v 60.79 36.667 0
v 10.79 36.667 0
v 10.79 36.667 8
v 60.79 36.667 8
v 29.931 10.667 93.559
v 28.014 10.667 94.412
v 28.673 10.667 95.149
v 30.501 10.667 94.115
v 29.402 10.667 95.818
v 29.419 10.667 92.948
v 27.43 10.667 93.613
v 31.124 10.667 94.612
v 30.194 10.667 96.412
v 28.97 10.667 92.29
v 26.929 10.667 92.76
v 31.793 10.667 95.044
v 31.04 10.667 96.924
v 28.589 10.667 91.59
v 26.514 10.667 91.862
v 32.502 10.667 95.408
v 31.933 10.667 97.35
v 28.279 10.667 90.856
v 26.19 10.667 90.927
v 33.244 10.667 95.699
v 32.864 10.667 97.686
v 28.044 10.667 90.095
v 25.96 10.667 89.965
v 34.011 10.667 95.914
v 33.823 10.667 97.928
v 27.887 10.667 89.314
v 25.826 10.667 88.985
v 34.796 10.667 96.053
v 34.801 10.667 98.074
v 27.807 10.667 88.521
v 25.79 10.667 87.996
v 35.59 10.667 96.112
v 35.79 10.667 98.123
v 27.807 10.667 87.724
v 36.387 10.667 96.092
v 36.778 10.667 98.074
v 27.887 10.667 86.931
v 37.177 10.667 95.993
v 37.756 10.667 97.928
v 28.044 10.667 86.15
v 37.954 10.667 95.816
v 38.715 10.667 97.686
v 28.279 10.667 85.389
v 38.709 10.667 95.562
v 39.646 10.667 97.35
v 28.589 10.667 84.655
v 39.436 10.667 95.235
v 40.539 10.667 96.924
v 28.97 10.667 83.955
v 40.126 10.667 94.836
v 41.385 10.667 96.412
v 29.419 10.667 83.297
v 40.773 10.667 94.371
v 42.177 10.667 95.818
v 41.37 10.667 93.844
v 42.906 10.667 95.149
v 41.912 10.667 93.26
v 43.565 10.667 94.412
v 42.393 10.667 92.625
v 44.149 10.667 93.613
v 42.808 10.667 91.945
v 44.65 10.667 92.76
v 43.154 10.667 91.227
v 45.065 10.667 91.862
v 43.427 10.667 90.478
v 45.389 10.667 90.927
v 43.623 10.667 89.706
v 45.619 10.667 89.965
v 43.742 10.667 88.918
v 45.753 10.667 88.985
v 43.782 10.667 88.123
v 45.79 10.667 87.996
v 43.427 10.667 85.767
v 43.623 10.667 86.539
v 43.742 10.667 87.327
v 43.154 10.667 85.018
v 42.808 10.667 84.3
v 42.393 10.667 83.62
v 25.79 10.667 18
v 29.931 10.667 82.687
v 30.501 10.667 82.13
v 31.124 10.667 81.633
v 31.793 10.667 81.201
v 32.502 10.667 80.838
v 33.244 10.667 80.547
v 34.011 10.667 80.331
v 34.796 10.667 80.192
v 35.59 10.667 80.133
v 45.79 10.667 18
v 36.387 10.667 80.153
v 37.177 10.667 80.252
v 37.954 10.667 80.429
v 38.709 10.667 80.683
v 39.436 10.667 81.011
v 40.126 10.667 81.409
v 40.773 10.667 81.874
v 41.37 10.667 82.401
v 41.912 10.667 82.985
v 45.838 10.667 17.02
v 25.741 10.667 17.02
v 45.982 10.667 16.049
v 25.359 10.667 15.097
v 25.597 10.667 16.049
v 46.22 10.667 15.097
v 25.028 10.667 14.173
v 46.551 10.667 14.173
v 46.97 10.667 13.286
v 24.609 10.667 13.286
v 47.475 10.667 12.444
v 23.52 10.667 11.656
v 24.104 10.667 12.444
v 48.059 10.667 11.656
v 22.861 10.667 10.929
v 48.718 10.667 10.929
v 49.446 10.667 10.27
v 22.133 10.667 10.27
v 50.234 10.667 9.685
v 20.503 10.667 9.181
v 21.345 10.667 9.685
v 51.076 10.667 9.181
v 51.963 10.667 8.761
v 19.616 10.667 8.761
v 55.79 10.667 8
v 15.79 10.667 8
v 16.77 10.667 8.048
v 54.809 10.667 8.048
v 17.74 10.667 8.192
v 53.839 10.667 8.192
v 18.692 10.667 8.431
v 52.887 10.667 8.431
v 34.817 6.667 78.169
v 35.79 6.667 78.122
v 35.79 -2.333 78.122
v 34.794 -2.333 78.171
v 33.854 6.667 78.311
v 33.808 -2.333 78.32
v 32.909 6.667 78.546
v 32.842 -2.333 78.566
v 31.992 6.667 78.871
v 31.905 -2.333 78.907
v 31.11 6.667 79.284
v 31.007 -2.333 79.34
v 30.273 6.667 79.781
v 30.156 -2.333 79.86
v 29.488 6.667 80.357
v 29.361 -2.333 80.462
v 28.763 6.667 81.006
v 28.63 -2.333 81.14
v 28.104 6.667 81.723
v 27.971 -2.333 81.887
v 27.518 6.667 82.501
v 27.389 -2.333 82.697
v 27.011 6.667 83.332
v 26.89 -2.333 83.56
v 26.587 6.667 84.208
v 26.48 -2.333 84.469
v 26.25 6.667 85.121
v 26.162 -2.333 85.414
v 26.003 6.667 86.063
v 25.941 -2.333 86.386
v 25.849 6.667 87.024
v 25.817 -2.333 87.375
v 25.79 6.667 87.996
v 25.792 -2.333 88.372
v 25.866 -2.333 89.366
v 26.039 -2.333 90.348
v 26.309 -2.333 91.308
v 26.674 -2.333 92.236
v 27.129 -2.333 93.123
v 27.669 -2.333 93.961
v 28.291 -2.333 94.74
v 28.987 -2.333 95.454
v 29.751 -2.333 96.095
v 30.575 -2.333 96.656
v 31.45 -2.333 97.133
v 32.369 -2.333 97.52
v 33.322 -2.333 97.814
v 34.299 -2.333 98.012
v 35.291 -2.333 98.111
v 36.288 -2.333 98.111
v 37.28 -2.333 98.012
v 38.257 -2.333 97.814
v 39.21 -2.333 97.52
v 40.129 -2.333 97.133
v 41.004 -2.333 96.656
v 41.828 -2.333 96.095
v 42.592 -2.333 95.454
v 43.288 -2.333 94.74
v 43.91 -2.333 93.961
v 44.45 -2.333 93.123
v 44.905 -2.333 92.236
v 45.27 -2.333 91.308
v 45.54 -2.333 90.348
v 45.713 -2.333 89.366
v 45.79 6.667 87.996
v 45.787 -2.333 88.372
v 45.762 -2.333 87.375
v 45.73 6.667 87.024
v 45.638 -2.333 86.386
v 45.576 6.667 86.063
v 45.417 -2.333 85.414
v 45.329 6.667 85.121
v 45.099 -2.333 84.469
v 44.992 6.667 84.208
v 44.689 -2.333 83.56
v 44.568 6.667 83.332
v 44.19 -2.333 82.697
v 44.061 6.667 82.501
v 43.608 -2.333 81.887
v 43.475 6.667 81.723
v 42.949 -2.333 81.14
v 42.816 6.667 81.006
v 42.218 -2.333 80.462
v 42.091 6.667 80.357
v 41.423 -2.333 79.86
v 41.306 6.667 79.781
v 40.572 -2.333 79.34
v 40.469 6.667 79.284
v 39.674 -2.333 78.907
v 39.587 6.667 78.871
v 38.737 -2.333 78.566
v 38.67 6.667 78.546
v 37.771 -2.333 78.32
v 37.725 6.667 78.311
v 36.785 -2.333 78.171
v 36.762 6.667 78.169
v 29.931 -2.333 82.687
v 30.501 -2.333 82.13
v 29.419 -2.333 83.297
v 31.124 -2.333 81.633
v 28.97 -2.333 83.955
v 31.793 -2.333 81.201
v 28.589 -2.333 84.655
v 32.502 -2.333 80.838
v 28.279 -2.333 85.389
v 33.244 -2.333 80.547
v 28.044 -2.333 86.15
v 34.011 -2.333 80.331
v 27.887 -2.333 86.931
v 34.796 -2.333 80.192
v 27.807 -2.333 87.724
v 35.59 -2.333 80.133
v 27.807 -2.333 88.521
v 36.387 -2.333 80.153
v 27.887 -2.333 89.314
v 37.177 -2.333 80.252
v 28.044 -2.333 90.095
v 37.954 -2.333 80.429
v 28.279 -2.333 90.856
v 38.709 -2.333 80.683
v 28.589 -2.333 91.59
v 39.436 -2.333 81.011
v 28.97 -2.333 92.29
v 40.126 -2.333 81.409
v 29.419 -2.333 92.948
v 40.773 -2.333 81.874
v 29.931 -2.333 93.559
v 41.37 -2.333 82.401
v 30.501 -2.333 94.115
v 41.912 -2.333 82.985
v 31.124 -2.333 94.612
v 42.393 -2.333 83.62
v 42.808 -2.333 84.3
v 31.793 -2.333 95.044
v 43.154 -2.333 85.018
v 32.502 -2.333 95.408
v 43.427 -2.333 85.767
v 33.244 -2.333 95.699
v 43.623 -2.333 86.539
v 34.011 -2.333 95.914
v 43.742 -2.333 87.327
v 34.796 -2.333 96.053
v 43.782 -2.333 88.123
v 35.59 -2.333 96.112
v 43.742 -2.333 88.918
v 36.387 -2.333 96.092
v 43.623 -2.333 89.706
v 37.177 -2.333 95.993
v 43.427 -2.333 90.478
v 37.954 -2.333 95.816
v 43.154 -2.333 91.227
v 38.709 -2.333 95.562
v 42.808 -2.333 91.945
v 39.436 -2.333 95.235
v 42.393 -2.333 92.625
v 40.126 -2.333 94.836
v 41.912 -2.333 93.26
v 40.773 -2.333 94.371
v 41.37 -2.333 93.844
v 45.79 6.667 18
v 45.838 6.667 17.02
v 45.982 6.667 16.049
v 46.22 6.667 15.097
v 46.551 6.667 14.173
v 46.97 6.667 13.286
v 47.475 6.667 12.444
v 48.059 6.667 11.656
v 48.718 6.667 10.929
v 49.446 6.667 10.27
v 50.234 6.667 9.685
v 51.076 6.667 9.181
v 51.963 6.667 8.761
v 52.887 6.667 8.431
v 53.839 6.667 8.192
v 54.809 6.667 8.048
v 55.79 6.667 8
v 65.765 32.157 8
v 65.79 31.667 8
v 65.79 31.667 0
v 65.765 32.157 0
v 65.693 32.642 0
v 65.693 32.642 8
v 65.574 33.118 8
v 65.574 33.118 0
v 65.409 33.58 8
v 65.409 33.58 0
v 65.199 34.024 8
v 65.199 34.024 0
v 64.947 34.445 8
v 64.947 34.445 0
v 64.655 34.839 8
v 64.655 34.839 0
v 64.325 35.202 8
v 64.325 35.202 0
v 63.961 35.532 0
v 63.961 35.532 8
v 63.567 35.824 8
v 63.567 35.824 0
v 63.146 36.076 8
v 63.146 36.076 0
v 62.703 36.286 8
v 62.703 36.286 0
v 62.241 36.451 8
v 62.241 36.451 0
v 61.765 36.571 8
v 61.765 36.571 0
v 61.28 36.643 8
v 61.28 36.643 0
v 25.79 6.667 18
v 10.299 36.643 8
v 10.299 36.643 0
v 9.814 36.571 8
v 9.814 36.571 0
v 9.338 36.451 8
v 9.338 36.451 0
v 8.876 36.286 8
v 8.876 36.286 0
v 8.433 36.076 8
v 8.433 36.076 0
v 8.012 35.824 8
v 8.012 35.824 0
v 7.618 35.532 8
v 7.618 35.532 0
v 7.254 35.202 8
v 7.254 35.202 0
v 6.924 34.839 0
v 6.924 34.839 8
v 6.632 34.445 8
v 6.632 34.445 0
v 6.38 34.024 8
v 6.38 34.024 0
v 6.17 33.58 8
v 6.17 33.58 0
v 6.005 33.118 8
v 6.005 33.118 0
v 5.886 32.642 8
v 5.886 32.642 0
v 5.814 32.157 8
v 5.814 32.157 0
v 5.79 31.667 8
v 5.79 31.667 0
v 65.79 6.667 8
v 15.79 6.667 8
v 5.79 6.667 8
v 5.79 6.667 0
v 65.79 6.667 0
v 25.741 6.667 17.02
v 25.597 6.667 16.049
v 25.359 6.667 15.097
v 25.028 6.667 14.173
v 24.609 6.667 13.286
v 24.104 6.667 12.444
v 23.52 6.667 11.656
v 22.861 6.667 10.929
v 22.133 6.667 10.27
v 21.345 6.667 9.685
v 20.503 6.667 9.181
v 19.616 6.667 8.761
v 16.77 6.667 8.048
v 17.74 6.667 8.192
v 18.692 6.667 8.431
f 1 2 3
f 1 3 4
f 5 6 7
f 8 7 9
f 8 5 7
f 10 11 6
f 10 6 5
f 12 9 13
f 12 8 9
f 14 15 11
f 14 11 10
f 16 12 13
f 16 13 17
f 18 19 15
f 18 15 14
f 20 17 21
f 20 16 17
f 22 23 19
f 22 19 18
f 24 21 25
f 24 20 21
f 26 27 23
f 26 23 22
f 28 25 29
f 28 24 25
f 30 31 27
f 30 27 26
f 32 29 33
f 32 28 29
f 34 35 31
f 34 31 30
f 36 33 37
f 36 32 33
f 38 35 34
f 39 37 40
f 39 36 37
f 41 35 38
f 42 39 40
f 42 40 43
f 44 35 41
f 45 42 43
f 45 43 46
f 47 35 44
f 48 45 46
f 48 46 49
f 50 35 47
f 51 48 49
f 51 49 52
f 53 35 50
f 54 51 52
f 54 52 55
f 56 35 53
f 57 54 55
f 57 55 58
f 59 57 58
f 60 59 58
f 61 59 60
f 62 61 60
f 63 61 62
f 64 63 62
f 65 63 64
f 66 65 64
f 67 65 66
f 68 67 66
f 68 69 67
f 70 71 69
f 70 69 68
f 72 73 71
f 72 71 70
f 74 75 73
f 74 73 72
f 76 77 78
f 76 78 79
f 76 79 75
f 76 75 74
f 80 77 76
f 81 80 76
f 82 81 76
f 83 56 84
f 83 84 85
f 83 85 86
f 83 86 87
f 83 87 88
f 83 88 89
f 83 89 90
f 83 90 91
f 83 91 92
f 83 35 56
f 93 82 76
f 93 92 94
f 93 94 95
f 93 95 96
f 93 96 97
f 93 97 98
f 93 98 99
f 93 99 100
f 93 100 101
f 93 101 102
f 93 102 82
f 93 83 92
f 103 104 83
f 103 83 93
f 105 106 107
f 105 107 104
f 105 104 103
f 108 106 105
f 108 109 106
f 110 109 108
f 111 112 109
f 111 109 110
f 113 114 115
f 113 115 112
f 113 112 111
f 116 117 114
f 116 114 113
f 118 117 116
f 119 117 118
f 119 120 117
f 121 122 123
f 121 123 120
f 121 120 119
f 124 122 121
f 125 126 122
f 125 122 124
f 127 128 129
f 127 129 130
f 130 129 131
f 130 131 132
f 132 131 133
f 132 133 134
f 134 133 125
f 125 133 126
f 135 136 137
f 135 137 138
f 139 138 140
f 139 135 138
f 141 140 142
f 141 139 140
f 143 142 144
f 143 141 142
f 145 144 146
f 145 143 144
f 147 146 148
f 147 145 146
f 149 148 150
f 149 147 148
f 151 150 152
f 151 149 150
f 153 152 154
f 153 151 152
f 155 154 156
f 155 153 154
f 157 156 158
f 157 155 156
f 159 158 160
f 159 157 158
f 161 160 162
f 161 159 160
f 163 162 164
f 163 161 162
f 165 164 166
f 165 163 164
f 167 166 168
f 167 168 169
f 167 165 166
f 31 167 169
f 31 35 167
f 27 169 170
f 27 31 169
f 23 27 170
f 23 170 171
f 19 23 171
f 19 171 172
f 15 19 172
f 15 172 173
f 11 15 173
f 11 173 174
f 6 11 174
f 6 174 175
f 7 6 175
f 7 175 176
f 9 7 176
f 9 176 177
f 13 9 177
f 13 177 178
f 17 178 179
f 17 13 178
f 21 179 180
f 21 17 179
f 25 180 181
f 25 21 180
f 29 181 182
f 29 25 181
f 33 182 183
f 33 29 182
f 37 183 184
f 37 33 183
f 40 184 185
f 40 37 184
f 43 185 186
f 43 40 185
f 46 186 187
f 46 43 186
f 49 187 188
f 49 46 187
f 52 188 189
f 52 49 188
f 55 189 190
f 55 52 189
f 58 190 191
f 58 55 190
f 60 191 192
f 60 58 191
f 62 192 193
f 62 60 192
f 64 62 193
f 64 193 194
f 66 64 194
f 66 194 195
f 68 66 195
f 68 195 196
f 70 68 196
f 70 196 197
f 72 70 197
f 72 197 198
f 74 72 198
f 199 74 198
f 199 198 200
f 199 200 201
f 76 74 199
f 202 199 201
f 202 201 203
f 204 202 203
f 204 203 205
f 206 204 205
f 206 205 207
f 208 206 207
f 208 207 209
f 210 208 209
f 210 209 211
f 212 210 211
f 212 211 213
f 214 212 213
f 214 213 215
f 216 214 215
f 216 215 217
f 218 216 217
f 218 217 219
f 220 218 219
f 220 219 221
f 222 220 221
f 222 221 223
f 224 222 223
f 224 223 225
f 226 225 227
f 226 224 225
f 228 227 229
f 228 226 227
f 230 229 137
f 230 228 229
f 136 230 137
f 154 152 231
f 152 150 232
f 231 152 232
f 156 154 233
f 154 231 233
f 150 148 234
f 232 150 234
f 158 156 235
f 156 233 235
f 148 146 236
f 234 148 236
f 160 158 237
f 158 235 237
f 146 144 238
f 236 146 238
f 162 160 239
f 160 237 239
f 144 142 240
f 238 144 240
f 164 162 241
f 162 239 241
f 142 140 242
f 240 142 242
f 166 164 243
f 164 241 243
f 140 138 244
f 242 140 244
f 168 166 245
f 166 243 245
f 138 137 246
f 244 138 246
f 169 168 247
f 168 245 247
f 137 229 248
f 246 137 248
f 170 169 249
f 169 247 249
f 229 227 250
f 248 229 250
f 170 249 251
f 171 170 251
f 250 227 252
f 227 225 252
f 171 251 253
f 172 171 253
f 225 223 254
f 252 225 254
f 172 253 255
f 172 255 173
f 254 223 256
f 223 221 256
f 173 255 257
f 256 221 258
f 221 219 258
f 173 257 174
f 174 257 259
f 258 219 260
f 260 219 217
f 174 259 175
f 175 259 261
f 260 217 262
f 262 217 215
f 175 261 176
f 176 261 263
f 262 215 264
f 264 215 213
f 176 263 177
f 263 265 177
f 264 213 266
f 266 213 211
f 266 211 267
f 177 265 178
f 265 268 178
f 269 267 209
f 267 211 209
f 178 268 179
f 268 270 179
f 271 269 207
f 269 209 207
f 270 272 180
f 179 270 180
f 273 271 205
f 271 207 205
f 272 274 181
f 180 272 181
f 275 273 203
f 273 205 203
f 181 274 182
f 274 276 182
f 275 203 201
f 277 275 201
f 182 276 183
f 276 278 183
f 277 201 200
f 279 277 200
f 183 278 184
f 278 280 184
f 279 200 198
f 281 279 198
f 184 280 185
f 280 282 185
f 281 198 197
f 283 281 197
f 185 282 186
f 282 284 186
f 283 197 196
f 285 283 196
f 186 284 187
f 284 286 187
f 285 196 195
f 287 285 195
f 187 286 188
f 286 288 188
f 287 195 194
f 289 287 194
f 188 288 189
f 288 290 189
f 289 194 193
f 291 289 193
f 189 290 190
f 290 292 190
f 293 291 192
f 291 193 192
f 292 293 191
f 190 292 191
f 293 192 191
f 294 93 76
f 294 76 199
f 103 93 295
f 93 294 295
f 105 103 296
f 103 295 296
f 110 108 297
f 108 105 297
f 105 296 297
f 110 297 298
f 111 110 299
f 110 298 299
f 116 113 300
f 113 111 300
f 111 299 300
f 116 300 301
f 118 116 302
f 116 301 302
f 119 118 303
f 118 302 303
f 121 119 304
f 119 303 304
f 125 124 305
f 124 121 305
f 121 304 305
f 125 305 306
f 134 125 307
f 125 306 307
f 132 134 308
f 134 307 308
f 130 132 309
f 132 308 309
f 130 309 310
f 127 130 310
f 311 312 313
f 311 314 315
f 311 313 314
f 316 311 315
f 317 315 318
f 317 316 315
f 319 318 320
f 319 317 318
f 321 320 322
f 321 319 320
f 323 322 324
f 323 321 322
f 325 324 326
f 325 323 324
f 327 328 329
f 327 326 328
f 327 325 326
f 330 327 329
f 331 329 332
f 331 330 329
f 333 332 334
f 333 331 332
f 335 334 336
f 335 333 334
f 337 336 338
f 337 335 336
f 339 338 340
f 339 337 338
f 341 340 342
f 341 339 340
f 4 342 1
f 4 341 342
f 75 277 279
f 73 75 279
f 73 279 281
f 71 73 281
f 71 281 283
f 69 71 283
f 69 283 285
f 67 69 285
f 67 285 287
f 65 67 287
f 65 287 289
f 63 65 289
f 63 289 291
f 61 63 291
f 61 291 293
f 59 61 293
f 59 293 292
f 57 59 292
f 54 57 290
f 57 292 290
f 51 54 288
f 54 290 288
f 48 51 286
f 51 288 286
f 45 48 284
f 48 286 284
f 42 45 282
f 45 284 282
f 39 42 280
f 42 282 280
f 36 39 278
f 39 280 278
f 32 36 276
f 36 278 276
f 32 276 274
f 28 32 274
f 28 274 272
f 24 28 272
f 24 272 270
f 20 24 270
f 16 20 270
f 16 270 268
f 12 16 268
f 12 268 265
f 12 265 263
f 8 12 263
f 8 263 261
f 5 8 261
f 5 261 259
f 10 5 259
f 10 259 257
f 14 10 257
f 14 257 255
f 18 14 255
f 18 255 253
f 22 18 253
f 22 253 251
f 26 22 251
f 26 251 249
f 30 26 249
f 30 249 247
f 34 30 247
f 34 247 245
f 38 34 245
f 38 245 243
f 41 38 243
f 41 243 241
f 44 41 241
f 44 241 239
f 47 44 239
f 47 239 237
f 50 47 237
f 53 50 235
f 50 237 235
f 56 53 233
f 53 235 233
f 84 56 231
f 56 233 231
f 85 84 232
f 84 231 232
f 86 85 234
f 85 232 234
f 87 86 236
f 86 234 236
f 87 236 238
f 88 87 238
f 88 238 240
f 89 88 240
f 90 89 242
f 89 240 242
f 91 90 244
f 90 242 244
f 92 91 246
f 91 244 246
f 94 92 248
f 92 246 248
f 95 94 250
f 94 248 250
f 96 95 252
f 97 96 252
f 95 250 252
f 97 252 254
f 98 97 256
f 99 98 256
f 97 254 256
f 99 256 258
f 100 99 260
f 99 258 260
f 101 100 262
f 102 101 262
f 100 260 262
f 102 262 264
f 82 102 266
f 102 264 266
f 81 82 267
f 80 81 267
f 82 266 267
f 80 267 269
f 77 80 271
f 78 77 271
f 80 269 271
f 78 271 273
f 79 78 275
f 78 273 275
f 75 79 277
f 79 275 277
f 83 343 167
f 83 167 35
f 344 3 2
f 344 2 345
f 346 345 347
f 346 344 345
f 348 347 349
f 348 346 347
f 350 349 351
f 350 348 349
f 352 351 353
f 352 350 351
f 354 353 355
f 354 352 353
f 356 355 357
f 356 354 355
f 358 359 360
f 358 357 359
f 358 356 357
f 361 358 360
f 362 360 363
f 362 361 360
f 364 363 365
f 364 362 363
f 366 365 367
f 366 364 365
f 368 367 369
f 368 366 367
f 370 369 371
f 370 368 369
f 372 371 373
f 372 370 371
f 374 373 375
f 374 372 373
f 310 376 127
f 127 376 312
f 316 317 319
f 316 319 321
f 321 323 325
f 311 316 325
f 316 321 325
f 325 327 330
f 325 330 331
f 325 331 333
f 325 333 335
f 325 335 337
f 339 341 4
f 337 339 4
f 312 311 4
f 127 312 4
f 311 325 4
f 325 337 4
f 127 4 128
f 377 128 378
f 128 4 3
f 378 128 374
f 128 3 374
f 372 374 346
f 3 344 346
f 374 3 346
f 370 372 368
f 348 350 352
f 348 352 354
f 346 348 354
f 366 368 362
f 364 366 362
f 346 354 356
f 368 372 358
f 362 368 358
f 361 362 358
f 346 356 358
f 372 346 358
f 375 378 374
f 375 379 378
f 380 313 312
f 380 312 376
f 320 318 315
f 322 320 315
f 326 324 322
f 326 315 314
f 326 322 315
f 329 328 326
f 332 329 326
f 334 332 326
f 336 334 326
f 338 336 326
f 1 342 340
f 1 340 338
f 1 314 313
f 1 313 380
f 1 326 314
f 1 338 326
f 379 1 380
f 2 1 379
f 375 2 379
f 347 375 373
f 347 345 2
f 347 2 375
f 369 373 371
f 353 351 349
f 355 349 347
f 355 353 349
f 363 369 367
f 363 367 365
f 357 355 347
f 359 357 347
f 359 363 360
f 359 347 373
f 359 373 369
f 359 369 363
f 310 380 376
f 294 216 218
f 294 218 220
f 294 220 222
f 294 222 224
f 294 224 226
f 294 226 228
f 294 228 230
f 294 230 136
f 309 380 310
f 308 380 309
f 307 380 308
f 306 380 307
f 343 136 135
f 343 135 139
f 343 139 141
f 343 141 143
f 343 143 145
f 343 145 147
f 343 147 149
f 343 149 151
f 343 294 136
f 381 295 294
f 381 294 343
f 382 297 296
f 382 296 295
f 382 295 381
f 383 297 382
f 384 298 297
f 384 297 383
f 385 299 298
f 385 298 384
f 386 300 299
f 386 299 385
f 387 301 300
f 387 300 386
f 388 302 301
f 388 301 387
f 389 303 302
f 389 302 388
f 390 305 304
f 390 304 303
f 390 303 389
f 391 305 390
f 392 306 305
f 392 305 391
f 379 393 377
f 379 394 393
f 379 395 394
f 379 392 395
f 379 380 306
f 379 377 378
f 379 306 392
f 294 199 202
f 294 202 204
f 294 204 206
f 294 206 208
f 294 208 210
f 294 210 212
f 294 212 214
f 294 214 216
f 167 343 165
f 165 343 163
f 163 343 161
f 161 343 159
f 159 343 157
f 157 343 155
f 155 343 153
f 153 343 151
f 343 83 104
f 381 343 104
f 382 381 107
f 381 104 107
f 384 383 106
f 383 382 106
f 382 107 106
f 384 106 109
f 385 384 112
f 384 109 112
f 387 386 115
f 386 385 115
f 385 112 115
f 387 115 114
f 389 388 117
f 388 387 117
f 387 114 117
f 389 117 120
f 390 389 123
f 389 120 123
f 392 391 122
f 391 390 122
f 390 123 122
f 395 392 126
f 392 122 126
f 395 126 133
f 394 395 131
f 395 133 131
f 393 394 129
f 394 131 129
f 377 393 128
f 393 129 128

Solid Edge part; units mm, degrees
sketch "Sketch1" plane through (0, 0, 0) normal (0, 0, 1) x (1, 0, 0)
  line L0 (5.7895, 6.6667) -> (5.7895, 36.6667)
  line L1 (5.7895, 36.6667) -> (65.7895, 36.6667)
  line L2 (65.7895, 36.6667) -> (65.7895, 6.6667)
  line L3 (65.7895, 6.6667) -> (5.7895, 6.6667)
  dimension "D1" = 60
  dimension "D2" = 30
extrude "Protrusion1" add sketch "Sketch1" along normal blind 8
fillet "Round_1" radius 5 2 edges at (65.7895, 36.6667, 4) (5.7895, 36.6667, 4)
sketch "Sketch2" plane through (35.7895, 21.6667, 8) normal (0, 0, 1) x (0, 1, 0)
  line L0 (-15, 10) -> (-11, 10)
  line L1 (-11, 10) -> (-11, -10)
  line L2 (-11, -10) -> (-15, -10)
  line L3 (-15, -10) -> (-15, 10)
  dimension "D1" = 20
  dimension "D2" = 20
extrude "ExtrudedProtrusion_3" add sketch "Sketch2" along normal blind 80
sketch "Sketch3" plane through (35.7895, 10.6667, 48) normal (0, 1, 0) x (0, 0, -1)
  circle A0 centre (-40.1226, 0) radius 10.0008
extrude "ExtrudedProtrusion_4" add sketch "Sketch3" against normal blind 13
fillet "Round_4" radius 10 2 edges at (45.7895, 8.6667, 8) (25.7895, 8.6667, 8)
sketch "Sketch4" plane through (35.7895, -2.3333, 88.1226) normal (0, -1, 0) x (1, 0, 0)
  circle A0 centre (0, 0) radius 7.9922
extrude "Cutout1" cut sketch "Sketch4" against normal through all
